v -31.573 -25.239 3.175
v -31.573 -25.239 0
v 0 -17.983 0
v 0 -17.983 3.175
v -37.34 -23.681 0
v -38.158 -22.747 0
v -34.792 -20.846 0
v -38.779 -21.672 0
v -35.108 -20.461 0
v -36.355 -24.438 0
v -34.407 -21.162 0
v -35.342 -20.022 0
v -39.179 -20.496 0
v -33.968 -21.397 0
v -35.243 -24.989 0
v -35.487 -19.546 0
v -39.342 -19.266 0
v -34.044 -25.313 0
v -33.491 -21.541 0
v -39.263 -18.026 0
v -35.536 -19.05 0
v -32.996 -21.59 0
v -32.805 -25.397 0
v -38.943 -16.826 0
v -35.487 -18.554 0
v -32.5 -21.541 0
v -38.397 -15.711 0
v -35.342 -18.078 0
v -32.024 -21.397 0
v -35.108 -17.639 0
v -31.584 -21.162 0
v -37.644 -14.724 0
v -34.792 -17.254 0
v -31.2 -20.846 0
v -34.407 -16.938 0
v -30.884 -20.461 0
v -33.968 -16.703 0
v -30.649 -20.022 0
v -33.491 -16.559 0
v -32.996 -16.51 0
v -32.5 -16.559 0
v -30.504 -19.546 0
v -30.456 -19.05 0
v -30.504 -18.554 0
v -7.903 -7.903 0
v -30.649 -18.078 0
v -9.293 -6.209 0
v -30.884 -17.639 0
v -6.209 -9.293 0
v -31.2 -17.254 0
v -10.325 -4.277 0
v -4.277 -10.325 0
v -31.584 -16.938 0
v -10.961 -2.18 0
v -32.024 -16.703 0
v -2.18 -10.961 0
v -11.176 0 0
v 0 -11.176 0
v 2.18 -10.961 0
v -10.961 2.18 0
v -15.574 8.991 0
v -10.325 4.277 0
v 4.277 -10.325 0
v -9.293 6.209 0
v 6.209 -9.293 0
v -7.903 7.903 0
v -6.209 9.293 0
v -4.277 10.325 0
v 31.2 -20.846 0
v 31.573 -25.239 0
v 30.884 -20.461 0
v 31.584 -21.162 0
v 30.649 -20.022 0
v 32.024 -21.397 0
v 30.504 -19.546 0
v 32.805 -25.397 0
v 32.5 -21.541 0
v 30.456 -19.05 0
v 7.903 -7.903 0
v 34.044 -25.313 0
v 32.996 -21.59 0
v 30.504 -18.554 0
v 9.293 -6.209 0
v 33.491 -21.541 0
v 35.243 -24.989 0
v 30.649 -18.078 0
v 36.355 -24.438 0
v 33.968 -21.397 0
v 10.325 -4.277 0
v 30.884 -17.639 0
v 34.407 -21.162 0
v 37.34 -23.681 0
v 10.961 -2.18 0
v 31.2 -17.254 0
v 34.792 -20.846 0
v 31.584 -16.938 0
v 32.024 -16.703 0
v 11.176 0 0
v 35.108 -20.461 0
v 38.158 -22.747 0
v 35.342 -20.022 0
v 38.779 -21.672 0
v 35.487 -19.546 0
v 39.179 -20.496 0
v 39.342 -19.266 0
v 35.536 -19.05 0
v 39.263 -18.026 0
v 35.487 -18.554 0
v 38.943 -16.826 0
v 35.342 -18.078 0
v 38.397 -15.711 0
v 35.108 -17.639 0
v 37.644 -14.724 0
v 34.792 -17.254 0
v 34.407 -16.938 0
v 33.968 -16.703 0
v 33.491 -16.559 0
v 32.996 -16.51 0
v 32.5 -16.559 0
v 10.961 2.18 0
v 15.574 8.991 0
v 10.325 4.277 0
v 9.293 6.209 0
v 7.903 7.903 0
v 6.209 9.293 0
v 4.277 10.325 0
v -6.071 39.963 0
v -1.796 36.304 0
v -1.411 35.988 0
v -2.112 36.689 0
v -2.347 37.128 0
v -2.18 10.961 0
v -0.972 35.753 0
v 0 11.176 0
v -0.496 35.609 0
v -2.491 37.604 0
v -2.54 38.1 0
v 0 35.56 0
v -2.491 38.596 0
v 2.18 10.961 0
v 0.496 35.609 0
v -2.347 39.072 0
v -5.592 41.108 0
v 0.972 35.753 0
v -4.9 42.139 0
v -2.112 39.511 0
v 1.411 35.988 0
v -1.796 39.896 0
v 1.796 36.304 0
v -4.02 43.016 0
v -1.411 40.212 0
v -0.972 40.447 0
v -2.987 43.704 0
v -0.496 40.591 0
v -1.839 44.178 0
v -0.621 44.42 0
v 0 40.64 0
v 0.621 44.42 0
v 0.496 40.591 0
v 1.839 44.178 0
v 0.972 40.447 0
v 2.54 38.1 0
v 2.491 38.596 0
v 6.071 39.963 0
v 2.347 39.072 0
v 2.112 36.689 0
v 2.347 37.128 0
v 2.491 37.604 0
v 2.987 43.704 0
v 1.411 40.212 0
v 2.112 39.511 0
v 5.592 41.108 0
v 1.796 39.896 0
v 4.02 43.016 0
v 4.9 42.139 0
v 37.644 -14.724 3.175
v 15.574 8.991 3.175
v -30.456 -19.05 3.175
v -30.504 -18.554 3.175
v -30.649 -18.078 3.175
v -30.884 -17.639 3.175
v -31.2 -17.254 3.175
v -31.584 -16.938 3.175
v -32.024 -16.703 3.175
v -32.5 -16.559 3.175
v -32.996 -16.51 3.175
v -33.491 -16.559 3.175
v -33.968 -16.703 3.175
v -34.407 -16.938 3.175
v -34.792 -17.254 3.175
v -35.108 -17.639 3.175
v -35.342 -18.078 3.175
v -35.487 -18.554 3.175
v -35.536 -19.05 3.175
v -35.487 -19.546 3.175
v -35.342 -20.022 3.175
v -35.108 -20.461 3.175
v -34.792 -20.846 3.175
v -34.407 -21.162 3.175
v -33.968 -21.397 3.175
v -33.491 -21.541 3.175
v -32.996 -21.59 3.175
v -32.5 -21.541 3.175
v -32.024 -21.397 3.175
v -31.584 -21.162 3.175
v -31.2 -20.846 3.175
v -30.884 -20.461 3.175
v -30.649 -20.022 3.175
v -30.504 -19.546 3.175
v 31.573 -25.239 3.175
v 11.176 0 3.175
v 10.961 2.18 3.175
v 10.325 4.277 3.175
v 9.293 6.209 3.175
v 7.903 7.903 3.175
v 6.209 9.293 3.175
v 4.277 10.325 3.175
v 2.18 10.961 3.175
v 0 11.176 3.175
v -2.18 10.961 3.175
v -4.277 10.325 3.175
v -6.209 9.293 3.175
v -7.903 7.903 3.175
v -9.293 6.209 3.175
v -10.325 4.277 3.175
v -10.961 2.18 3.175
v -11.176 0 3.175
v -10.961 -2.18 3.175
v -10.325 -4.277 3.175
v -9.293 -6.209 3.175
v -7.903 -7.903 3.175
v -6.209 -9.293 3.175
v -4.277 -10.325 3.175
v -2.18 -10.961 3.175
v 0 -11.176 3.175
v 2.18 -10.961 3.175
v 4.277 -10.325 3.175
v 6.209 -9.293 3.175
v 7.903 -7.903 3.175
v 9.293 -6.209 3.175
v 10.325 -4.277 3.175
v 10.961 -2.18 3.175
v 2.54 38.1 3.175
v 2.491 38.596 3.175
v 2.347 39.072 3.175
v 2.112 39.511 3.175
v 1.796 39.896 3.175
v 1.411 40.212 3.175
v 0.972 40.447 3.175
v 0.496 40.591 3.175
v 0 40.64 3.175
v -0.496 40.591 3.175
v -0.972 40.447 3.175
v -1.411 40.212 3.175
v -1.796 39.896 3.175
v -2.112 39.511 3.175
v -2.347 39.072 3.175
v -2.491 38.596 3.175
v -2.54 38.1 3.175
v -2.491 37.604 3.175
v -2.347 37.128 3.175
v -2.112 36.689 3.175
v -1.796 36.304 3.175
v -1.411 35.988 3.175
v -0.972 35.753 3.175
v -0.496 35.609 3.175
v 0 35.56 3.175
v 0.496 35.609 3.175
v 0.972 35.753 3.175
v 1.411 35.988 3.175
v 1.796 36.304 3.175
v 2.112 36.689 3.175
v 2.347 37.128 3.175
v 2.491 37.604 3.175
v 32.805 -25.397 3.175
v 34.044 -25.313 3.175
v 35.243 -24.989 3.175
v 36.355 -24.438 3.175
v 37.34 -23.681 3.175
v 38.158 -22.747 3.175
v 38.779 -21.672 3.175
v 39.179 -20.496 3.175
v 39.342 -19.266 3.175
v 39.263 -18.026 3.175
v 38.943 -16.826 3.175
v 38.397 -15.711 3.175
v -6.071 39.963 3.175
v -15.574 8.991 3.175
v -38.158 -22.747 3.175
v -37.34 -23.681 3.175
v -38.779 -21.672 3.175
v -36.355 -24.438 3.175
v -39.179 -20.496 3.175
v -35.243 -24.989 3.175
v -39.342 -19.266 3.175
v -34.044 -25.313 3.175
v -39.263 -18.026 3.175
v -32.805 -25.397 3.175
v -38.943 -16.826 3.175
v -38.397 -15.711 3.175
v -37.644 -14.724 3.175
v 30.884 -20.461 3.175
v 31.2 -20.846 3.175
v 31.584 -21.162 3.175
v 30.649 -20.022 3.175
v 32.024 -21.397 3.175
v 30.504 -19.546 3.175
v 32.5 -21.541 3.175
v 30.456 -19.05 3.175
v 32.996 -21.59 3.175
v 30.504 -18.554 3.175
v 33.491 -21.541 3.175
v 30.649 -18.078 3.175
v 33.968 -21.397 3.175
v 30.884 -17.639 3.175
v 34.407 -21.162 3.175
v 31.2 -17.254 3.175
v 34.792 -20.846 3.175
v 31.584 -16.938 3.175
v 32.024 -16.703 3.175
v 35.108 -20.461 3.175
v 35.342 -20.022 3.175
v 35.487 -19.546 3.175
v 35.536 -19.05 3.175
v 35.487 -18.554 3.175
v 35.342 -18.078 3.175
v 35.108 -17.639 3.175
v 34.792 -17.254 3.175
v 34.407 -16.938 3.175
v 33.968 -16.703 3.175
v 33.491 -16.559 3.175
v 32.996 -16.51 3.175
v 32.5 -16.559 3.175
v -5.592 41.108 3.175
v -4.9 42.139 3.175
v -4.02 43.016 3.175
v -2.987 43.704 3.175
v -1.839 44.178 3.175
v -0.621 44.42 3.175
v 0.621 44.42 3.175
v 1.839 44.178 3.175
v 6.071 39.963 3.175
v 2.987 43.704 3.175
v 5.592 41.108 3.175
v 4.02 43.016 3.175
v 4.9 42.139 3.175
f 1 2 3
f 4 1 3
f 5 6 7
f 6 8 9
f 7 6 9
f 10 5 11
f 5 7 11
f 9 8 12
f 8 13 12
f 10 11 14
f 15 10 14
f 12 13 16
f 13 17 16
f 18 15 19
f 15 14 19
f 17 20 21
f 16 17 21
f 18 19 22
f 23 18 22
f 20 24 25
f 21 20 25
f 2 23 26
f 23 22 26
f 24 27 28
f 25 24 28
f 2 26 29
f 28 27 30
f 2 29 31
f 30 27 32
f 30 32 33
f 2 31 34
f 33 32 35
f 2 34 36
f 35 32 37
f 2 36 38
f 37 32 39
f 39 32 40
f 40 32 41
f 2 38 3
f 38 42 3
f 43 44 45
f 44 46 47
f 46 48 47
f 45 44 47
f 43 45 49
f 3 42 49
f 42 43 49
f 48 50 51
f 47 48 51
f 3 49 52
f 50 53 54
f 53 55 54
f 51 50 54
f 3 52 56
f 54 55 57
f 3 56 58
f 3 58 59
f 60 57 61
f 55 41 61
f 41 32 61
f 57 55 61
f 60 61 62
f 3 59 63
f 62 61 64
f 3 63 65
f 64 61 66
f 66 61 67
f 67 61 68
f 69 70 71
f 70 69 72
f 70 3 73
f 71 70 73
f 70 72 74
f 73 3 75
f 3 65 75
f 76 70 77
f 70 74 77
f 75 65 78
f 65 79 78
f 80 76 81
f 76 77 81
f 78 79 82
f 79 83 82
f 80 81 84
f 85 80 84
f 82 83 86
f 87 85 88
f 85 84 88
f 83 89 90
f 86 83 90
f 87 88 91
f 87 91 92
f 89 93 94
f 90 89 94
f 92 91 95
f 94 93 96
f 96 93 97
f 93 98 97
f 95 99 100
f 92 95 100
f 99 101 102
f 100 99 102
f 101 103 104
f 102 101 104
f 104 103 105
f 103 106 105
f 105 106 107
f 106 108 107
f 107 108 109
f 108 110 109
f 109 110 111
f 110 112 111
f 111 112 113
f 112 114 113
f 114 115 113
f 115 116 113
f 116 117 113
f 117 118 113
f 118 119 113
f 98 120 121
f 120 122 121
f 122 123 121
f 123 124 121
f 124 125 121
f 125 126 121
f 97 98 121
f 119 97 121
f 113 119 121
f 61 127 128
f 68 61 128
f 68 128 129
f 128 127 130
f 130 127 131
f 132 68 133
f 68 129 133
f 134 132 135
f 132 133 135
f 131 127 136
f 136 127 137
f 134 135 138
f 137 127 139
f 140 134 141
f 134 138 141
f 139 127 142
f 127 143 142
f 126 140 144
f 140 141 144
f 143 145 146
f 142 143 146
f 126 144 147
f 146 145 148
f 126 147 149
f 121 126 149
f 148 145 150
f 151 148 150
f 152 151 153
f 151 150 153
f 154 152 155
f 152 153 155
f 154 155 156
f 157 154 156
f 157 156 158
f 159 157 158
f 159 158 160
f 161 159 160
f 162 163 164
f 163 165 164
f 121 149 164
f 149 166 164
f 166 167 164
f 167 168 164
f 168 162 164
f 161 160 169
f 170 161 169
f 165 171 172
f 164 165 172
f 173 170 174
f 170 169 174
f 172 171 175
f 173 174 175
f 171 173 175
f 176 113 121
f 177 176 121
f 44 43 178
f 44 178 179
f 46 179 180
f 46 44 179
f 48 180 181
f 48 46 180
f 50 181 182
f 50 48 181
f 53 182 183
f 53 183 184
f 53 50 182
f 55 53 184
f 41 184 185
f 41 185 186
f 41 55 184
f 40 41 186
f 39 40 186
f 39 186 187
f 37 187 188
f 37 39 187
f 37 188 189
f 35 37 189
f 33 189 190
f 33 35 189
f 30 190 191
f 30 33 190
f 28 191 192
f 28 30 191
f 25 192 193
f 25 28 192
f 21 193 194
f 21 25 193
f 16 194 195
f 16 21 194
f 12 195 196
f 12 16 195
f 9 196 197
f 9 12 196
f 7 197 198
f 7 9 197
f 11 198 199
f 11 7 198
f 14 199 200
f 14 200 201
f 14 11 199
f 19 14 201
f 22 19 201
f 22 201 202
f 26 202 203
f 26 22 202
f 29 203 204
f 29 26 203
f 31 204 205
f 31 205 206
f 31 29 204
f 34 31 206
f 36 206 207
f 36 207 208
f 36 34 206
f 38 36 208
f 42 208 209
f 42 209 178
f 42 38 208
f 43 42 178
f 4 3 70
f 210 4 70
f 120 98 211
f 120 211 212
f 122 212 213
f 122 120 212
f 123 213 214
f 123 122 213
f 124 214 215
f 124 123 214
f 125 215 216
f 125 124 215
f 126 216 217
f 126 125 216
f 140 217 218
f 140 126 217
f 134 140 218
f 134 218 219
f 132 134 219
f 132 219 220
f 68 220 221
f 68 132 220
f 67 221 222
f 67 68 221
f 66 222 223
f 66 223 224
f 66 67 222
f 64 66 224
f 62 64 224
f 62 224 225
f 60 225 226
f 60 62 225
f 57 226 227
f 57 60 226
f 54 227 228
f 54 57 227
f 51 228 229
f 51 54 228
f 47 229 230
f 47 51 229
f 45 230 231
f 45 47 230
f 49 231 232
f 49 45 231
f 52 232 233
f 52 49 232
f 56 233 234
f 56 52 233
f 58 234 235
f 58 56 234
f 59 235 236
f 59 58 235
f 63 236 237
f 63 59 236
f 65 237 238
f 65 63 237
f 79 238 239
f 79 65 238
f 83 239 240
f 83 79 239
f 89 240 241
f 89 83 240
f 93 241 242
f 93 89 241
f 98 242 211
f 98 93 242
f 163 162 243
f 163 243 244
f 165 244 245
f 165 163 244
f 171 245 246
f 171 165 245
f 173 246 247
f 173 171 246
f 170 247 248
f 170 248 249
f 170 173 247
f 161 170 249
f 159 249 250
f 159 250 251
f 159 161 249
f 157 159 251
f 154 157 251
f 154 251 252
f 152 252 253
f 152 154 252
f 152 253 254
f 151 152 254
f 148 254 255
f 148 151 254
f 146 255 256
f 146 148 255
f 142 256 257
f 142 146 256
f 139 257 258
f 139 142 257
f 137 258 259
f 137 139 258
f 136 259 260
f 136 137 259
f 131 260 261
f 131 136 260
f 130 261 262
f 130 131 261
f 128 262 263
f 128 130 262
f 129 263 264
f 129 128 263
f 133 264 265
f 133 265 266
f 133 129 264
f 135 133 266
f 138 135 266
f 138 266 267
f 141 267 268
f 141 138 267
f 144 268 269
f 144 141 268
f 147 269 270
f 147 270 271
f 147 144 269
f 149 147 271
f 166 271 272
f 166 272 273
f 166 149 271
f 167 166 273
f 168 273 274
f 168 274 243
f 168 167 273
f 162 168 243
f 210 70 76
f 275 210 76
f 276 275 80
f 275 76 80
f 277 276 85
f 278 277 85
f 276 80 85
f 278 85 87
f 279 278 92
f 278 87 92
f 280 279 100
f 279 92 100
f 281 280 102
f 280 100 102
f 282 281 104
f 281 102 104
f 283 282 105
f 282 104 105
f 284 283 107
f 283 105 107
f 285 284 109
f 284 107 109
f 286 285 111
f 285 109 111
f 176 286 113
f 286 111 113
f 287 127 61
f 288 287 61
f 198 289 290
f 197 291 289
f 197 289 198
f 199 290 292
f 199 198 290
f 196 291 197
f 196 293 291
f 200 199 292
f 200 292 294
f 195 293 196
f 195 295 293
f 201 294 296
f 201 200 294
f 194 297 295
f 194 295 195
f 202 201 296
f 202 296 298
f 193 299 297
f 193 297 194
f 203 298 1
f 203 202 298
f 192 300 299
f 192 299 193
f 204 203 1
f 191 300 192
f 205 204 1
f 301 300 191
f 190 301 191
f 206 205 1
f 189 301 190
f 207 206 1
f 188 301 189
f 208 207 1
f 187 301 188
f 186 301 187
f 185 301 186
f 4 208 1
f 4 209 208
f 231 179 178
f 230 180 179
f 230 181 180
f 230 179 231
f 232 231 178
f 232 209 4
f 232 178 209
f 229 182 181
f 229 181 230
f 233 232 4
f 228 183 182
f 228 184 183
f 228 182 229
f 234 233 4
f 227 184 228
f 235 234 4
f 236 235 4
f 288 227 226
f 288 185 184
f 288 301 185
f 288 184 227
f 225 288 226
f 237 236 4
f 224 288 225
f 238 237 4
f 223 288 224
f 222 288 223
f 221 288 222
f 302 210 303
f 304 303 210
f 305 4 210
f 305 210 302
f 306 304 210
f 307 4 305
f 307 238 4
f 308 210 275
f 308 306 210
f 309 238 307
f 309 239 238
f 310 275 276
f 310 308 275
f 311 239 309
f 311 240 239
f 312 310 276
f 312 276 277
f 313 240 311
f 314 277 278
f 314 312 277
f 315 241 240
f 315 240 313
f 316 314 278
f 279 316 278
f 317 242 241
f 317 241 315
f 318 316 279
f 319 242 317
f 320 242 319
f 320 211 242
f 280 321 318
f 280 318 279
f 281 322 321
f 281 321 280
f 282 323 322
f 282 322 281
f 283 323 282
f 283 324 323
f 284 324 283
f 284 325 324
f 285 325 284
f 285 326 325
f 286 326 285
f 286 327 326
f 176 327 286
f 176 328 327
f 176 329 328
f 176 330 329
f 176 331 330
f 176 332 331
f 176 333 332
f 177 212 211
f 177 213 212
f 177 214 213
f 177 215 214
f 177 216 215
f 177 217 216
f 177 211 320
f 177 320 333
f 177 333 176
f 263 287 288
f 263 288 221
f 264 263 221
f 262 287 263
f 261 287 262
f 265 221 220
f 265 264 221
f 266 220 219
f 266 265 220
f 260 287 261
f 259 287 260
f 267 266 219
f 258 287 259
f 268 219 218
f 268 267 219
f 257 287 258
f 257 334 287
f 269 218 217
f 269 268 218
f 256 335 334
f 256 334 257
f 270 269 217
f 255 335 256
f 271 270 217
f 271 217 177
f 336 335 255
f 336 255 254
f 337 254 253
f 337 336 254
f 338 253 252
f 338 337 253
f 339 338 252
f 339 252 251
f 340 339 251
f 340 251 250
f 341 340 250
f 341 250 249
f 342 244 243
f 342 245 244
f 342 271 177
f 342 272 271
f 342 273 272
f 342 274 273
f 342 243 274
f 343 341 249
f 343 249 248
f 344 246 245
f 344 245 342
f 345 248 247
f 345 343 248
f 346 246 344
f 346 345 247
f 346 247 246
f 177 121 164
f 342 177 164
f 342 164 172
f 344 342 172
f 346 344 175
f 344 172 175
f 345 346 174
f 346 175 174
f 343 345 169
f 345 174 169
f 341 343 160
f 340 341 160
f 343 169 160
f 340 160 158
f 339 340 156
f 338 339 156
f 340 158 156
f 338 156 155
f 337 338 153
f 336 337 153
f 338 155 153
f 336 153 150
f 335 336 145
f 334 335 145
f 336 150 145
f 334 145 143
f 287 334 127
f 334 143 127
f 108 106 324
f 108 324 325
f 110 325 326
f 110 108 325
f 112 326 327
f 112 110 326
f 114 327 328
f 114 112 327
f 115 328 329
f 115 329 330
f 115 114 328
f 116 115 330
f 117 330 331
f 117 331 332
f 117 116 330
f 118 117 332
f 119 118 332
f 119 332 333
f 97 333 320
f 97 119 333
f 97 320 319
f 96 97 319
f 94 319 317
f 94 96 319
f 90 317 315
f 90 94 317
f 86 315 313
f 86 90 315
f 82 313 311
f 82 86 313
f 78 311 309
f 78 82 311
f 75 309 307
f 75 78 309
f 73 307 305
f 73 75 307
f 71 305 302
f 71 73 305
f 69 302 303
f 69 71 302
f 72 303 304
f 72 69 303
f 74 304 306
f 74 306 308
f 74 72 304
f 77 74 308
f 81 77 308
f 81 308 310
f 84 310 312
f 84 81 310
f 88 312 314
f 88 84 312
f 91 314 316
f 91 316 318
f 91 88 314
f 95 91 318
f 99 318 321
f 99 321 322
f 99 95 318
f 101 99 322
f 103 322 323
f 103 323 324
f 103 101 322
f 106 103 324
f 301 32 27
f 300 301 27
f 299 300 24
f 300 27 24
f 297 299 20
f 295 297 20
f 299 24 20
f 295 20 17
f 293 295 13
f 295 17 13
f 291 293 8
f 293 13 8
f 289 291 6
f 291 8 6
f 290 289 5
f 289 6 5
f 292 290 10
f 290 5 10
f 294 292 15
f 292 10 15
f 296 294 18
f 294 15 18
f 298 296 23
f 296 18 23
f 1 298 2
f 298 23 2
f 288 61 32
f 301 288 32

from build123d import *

# Parameters (mm, degrees)
SKETCH3_R           = 11.176
SKETCH3_R_2         = 2.54
BOSS_EXTRUDE2_DEPTH = 3.175


with BuildPart() as part:
    # Sketch3 → Boss-Extrude2 (new body)
    with BuildSketch(Plane.XY):
        with BuildLine():
            Line((-6.070664946, 39.962666667), (-15.573595811, 8.991419734))
            Line((-15.573595811, 8.991419734), (-37.644017009, -14.723983272))
            ThreePointArc((-37.644017009, -14.723983272), (-38.494829198, -22.225), (-31.573352063, -25.238683395))
            Line((-31.573352063, -25.238683395), (0, -17.982839467))
            Line((0, -17.982839467), (31.573352063, -25.238683395))
            ThreePointArc((31.573352063, -25.238683395), (38.494829198, -22.225), (37.644017009, -14.723983272))
            Line((37.644017009, -14.723983272), (15.573595811, 8.991419734))
            Line((15.573595811, 8.991419734), (6.070664946, 39.962666667))
            ThreePointArc((6.070664946, 39.962666667), (0, 44.45), (-6.070664946, 39.962666667))
        make_face()
        Circle(SKETCH3_R, mode=Mode.SUBTRACT)
        with Locations((0, 38.1)):
            Circle(SKETCH3_R_2, mode=Mode.SUBTRACT)
        with Locations((32.995567884, -19.05)):
            Circle(SKETCH3_R_2, mode=Mode.SUBTRACT)
        with Locations((-32.995567884, -19.05)):
            Circle(SKETCH3_R_2, mode=Mode.SUBTRACT)
    extrude(amount=BOSS_EXTRUDE2_DEPTH)


solid = part.part
